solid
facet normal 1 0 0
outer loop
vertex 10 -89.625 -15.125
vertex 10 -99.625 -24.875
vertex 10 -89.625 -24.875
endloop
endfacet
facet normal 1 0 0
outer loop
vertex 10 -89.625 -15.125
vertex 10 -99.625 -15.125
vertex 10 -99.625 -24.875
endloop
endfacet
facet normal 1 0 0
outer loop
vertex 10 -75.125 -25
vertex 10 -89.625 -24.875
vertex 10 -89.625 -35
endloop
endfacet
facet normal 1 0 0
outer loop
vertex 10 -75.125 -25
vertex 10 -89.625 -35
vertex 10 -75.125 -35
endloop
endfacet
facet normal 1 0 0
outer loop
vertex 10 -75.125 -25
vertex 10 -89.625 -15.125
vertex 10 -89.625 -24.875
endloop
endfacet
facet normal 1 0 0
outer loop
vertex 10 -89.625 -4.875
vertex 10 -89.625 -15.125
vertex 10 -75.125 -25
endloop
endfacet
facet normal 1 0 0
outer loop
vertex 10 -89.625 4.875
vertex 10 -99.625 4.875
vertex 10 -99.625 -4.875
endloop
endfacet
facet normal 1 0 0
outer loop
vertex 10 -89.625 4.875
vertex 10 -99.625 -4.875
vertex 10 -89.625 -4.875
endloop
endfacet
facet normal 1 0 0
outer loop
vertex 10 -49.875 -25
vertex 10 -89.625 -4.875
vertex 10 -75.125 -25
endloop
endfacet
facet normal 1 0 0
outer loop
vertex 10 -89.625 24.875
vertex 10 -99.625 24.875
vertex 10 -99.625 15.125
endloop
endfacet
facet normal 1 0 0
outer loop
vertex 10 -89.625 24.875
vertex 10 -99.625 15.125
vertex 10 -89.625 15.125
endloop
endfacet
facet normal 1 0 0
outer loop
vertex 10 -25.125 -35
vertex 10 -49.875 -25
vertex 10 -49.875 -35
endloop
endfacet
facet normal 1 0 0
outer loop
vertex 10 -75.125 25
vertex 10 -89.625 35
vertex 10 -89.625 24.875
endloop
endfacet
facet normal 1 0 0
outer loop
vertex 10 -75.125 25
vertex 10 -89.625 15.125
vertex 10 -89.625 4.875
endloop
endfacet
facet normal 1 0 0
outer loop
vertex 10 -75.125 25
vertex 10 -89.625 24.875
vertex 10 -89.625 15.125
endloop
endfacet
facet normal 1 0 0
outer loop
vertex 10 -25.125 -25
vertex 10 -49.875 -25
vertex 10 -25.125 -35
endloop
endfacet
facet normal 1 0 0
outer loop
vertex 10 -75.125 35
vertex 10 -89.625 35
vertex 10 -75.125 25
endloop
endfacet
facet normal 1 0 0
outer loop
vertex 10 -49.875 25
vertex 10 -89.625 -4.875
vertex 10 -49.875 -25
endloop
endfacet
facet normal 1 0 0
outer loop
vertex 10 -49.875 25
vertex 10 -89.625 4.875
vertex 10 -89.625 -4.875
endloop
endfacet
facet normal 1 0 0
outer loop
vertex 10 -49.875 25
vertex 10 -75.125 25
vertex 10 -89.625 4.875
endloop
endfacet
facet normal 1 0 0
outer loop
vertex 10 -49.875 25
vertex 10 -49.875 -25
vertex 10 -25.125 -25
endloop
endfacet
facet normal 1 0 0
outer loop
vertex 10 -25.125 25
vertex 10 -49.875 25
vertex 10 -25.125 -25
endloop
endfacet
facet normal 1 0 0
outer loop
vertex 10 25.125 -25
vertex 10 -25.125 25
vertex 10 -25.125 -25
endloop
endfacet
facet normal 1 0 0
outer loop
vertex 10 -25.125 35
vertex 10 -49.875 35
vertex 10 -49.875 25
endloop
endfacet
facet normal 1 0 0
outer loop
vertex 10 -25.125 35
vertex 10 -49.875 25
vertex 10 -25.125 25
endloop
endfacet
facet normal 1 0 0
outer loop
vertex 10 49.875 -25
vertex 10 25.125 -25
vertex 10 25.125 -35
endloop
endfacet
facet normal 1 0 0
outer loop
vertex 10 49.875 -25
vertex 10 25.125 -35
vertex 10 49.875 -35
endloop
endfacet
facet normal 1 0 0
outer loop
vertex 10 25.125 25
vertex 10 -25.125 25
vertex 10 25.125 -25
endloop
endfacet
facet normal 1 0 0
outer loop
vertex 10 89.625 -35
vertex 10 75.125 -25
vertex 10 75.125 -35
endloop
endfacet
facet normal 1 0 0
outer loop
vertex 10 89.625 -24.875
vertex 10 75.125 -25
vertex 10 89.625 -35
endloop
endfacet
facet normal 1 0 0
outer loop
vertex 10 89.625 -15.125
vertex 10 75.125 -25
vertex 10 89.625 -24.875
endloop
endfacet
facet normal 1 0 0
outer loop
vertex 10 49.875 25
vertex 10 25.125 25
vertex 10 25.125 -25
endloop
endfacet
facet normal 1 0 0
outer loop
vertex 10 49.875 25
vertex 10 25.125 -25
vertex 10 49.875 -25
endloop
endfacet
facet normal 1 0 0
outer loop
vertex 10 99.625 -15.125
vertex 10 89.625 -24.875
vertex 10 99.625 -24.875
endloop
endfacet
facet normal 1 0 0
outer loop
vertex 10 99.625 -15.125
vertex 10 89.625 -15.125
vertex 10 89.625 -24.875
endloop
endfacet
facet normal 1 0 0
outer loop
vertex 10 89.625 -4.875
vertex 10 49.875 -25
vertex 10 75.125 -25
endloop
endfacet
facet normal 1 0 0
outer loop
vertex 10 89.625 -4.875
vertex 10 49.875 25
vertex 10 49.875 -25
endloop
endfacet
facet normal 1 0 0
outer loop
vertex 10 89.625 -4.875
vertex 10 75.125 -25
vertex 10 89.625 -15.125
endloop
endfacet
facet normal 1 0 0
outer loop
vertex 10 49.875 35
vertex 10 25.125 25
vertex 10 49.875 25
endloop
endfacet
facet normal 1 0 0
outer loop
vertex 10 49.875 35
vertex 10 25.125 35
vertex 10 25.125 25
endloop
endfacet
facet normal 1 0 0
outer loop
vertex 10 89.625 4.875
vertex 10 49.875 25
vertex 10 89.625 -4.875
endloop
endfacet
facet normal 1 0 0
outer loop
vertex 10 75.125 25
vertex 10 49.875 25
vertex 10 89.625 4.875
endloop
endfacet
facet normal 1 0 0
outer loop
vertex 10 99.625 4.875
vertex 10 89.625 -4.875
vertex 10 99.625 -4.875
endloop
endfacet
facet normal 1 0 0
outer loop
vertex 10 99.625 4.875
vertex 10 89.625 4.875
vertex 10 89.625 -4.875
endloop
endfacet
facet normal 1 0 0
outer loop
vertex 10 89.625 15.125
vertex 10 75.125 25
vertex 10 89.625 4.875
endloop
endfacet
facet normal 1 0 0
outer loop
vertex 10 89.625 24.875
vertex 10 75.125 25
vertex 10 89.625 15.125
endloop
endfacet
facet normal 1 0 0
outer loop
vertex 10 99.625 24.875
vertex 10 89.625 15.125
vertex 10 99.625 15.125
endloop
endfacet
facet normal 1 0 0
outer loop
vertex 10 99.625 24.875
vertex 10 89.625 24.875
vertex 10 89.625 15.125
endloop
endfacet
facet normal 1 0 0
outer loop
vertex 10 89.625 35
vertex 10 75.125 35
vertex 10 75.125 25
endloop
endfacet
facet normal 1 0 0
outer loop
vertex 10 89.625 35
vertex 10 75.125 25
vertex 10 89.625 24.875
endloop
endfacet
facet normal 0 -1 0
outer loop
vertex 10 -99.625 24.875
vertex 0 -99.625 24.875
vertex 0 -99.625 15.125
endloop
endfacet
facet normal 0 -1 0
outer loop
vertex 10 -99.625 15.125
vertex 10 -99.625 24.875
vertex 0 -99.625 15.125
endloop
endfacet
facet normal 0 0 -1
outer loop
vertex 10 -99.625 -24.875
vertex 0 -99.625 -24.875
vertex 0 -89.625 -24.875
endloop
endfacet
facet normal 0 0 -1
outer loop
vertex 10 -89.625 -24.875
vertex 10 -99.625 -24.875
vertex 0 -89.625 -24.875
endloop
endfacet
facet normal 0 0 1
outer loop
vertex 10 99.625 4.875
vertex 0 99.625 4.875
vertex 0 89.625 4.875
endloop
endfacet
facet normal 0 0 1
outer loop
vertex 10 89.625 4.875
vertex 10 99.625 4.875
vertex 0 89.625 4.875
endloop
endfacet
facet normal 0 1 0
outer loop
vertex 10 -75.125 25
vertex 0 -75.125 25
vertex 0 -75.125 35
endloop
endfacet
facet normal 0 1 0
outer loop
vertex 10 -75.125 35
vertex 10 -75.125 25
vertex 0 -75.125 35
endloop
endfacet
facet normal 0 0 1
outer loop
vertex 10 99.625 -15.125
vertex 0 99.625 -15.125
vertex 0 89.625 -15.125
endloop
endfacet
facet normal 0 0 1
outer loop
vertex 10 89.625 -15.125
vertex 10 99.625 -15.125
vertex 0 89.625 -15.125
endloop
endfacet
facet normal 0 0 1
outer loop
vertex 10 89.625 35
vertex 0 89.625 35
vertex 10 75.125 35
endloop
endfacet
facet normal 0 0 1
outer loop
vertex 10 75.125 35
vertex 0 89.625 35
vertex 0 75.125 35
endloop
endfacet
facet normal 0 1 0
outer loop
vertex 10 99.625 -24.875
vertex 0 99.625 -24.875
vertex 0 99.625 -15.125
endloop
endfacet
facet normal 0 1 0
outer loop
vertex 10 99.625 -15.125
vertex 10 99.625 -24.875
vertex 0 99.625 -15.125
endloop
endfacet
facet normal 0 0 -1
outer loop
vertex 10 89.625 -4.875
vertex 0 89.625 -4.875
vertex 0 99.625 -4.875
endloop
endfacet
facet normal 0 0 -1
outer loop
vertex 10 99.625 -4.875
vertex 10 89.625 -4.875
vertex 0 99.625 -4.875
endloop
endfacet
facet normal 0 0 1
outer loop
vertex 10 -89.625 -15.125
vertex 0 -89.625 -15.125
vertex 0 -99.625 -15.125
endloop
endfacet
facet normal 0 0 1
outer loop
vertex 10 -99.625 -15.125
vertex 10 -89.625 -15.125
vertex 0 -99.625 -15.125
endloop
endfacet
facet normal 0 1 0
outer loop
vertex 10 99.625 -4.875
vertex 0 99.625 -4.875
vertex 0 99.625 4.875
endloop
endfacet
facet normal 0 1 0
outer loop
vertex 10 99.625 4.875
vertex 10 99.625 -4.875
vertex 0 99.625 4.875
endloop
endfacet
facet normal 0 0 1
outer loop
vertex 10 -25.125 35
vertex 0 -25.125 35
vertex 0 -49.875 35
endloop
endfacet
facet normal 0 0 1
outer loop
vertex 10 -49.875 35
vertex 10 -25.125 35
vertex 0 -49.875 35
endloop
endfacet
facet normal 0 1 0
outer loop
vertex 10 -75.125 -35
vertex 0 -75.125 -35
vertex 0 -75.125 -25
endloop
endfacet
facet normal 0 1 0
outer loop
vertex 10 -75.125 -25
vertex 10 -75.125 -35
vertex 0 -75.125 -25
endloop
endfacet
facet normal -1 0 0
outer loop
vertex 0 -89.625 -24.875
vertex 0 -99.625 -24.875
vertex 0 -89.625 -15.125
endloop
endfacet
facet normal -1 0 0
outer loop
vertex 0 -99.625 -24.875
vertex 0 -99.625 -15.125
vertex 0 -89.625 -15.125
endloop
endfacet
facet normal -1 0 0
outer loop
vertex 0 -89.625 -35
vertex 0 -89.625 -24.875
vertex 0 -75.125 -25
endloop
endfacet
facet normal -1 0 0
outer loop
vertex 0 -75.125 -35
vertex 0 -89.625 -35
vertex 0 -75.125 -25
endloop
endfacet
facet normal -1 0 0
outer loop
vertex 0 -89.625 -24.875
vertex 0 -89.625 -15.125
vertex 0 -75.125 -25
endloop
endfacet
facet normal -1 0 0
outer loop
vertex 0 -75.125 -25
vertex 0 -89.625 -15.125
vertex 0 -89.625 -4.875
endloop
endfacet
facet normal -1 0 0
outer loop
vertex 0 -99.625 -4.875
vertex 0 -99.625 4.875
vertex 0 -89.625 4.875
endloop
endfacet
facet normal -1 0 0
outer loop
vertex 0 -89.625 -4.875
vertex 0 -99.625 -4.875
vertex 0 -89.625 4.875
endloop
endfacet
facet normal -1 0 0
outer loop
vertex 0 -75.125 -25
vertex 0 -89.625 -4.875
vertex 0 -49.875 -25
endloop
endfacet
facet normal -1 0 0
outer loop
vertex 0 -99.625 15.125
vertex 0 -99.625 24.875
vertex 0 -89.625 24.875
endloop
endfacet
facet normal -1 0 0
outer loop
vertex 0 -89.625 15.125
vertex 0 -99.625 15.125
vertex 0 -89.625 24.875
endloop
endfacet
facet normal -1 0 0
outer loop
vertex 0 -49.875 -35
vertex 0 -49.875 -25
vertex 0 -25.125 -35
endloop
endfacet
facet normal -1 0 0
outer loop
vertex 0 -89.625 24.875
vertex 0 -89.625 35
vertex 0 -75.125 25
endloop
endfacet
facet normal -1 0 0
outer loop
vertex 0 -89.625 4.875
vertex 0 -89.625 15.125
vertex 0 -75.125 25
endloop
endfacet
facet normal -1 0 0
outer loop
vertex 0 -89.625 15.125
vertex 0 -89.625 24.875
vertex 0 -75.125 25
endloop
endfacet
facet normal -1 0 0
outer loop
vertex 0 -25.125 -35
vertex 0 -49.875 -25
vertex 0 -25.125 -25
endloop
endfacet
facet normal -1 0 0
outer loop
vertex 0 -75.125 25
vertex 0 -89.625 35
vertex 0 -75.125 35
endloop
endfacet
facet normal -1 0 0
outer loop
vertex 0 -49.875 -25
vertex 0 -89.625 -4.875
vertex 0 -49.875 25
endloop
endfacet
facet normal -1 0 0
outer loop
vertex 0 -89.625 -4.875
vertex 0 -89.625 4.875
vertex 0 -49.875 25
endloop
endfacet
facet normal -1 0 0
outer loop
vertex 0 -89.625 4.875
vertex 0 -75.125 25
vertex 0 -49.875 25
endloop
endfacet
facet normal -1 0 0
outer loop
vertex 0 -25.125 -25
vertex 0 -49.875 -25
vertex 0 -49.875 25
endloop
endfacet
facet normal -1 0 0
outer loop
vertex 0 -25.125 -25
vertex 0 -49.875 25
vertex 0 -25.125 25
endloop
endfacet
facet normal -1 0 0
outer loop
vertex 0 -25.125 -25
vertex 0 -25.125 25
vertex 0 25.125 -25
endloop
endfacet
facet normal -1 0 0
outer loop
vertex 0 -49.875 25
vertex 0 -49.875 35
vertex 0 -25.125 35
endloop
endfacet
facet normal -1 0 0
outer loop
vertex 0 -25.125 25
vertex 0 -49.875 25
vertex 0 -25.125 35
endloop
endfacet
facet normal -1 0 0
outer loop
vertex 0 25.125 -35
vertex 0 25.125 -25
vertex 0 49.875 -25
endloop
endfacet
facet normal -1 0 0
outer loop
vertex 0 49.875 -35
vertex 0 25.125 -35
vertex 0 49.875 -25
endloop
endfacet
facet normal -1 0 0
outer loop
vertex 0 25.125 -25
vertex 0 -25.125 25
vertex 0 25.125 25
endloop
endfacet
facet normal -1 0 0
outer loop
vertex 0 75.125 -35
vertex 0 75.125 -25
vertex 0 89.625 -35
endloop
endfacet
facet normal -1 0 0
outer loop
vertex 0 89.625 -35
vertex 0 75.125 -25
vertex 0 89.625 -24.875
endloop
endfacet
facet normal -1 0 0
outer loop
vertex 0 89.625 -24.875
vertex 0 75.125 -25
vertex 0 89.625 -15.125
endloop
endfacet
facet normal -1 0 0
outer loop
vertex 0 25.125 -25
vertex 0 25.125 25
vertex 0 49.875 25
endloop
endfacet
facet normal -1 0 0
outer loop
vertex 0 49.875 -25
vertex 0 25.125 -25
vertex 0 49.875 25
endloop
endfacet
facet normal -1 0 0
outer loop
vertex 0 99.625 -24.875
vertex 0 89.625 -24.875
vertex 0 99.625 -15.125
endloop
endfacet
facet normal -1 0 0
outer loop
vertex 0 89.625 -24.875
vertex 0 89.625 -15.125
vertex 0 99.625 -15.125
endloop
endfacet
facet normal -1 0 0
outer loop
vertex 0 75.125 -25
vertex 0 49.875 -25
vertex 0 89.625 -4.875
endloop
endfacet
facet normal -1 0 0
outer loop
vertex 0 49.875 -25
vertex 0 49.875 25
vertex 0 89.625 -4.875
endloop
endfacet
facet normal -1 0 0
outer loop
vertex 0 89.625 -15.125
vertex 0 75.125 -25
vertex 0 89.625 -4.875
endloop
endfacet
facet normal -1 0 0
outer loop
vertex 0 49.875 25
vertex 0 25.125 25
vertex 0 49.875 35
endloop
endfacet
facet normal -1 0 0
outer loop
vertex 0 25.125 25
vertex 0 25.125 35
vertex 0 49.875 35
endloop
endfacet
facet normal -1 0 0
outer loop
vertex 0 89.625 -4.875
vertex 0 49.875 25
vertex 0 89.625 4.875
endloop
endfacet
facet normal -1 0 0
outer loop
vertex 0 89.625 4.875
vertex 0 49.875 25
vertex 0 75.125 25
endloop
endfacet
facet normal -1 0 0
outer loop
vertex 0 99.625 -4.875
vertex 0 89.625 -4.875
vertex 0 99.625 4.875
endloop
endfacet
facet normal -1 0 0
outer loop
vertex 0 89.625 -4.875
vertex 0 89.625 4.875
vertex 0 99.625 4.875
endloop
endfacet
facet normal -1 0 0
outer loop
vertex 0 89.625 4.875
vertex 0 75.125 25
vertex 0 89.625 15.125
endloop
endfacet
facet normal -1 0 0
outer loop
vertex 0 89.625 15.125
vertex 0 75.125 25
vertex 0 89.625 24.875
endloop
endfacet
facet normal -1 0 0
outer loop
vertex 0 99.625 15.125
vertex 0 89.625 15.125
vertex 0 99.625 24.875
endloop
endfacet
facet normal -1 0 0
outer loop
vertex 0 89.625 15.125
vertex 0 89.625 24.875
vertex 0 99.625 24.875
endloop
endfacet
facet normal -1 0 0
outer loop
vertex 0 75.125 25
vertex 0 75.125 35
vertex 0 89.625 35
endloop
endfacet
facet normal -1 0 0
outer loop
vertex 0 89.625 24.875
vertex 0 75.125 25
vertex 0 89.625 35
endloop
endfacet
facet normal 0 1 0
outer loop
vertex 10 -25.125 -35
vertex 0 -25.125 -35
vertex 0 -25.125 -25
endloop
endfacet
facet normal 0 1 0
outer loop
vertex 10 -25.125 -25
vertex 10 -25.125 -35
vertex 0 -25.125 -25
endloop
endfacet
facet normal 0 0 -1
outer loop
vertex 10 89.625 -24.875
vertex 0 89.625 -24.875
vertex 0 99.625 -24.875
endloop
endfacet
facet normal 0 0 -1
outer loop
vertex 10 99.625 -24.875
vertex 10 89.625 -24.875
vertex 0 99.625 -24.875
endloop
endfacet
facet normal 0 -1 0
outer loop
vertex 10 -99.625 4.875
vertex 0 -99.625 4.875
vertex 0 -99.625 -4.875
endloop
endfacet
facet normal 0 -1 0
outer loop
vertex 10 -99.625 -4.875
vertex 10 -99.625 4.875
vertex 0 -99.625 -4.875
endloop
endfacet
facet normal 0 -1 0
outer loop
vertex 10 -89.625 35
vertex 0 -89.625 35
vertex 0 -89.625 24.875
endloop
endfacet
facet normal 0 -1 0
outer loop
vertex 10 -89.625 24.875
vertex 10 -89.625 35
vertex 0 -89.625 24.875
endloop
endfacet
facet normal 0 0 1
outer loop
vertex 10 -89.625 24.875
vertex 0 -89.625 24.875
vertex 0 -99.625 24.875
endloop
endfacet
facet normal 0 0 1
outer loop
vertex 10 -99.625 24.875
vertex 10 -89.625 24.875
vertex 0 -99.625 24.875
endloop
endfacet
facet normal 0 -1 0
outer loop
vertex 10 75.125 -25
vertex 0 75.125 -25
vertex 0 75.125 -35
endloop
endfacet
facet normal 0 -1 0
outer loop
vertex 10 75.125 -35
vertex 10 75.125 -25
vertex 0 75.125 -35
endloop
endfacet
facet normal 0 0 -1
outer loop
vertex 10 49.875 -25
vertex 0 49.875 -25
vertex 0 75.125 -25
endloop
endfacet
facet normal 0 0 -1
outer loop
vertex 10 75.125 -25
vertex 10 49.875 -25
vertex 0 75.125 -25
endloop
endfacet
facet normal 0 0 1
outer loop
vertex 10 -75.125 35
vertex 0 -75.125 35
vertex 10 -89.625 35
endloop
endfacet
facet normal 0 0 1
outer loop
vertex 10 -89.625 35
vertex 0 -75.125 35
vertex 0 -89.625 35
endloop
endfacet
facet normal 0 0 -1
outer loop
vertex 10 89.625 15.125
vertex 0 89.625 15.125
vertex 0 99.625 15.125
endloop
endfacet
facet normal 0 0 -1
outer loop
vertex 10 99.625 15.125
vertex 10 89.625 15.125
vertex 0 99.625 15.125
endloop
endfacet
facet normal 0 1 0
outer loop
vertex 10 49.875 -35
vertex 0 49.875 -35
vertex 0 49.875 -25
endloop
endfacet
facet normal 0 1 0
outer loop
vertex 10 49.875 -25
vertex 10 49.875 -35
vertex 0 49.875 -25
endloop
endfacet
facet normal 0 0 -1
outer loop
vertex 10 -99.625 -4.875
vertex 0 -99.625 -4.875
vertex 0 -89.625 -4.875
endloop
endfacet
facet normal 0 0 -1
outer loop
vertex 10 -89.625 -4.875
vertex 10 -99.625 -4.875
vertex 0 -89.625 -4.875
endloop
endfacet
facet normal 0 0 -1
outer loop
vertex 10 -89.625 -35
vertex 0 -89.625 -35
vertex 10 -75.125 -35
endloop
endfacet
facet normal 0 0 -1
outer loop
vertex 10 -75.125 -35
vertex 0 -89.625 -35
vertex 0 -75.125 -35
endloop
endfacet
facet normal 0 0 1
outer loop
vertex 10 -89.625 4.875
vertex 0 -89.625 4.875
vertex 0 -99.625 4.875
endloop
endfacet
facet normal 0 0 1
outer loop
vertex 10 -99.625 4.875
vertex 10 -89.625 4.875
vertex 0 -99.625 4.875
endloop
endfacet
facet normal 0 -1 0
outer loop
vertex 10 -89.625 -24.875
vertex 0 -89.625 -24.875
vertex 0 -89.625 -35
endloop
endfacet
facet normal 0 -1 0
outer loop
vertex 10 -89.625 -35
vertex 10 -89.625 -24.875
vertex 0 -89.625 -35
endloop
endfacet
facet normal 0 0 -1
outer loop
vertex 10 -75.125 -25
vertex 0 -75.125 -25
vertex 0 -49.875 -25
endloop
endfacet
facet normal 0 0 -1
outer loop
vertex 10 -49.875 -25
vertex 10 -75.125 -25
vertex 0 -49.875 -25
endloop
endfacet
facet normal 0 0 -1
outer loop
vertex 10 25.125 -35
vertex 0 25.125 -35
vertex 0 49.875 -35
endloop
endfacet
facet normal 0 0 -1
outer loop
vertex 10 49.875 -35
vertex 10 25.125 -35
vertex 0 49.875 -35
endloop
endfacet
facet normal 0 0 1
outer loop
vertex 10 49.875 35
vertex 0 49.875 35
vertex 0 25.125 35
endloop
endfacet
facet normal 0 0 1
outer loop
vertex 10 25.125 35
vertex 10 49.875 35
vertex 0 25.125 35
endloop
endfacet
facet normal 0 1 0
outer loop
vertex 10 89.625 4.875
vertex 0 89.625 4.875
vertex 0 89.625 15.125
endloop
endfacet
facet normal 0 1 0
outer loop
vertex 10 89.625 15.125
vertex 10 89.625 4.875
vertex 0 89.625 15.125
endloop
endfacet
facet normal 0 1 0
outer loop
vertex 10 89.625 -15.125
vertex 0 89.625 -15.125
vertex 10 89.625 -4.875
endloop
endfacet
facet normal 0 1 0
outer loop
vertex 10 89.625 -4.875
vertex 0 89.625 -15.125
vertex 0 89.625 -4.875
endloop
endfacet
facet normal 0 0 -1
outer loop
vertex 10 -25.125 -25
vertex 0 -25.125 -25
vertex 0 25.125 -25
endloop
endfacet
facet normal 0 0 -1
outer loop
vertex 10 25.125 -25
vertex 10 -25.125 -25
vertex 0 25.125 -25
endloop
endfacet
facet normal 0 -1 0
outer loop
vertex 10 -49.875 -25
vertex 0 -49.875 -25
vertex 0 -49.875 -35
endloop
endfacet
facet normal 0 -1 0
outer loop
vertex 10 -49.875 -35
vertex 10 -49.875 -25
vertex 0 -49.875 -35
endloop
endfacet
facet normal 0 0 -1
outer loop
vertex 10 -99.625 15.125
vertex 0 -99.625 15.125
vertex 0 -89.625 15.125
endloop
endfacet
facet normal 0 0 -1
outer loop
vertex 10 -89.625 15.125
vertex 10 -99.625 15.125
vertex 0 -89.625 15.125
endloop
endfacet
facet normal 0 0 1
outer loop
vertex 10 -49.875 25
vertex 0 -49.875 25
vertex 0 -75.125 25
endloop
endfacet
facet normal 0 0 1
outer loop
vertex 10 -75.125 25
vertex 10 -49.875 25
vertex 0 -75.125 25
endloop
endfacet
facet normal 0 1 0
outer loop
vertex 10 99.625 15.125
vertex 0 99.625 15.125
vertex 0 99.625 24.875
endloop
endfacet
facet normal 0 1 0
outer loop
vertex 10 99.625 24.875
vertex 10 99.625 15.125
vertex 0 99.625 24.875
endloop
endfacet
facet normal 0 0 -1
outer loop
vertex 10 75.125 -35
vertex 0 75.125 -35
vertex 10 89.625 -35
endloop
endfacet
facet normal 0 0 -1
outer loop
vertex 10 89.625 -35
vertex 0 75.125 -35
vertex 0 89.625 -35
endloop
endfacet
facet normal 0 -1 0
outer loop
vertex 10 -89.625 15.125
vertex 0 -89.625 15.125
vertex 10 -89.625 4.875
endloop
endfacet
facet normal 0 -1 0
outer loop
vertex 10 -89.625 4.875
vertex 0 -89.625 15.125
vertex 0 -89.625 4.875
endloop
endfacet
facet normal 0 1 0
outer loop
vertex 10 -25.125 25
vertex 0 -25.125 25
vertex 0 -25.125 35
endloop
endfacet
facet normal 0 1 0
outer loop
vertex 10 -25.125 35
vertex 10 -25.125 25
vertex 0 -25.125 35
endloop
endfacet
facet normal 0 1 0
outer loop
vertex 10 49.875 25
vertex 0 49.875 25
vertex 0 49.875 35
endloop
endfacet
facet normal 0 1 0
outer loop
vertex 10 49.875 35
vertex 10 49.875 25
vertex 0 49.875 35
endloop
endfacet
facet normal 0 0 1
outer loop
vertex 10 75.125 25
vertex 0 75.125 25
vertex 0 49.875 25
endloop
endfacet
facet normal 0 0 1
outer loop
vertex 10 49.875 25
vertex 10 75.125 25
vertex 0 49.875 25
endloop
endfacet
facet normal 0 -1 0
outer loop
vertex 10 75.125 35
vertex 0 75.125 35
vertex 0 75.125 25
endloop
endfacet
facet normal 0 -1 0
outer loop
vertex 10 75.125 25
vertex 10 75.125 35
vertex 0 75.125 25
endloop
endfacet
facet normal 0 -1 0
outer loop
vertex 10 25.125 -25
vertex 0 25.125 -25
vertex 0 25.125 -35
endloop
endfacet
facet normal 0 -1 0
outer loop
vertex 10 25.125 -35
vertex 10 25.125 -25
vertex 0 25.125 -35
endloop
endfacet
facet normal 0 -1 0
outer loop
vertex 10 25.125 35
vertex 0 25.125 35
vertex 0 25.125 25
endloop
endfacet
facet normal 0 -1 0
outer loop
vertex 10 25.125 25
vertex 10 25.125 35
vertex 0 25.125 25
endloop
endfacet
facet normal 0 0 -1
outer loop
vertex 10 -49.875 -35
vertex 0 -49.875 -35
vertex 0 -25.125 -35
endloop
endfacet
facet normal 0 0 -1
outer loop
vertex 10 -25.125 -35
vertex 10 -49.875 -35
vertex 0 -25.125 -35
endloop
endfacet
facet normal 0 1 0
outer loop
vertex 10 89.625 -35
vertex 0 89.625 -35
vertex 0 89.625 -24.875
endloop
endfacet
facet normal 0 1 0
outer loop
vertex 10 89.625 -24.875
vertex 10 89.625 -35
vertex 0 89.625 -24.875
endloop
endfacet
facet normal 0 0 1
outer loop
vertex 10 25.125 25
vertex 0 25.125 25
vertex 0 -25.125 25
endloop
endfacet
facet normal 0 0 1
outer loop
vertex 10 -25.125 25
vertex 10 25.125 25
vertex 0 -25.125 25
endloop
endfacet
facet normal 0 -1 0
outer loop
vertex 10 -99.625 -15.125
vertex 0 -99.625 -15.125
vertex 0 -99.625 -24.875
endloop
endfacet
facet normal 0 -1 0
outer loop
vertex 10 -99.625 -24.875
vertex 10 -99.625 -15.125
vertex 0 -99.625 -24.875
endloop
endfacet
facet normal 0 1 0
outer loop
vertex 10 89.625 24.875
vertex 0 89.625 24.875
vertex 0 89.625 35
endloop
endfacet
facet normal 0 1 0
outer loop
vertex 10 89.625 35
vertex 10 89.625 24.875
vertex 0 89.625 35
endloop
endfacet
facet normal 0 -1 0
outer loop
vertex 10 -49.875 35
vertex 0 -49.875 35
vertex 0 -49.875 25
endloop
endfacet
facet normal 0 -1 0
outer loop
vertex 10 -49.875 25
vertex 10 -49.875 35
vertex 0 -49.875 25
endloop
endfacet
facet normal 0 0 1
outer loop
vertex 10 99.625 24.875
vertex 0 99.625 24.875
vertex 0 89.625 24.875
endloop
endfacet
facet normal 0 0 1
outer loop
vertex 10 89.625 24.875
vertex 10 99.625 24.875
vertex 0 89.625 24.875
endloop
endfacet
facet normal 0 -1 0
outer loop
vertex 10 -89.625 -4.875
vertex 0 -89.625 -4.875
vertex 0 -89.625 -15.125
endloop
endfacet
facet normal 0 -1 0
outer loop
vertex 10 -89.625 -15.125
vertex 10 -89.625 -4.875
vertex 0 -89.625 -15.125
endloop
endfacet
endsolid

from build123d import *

# Parameters (mm, degrees)
F1_DEPTH = 10


with BuildPart() as f1:
    # F0 (on Right) → F1 (new body)
    with BuildSketch(Plane.YZ):
        Polygon((-99.625, -24.875), (-89.625, -24.875), (-89.625, -35), (-75.125, -35), (-75.125, -25), (-49.875, -25), (-49.875, -35), (-25.125, -35), (-25.125, -25), (0, -25), (25.125, -25), (25.125, -35), (49.875, -35), (49.875, -25), (75.125, -25), (75.125, -35), (89.625, -35), (89.625, -24.875), (99.625, -24.875), (99.625, -15.125), (89.625, -15.125), (89.625, -4.875), (99.625, -4.875), (99.625, 0), (99.625, 4.875), (89.625, 4.875), (89.625, 15.125), (99.625, 15.125), (99.625, 24.875), (89.625, 24.875), (89.625, 35), (75.125, 35), (75.125, 25), (49.875, 25), (49.875, 35), (25.125, 35), (25.125, 25), (0, 25), (-25.125, 25), (-25.125, 35), (-49.875, 35), (-49.875, 25), (-75.125, 25), (-75.125, 35), (-89.625, 35), (-89.625, 24.875), (-99.625, 24.875), (-99.625, 15.125), (-89.625, 15.125), (-89.625, 4.875), (-99.625, 4.875), (-99.625, 0), (-99.625, -4.875), (-89.625, -4.875), (-89.625, -15.125), (-99.625, -15.125), align=None)
    extrude(amount=F1_DEPTH)


solid = f1.part
